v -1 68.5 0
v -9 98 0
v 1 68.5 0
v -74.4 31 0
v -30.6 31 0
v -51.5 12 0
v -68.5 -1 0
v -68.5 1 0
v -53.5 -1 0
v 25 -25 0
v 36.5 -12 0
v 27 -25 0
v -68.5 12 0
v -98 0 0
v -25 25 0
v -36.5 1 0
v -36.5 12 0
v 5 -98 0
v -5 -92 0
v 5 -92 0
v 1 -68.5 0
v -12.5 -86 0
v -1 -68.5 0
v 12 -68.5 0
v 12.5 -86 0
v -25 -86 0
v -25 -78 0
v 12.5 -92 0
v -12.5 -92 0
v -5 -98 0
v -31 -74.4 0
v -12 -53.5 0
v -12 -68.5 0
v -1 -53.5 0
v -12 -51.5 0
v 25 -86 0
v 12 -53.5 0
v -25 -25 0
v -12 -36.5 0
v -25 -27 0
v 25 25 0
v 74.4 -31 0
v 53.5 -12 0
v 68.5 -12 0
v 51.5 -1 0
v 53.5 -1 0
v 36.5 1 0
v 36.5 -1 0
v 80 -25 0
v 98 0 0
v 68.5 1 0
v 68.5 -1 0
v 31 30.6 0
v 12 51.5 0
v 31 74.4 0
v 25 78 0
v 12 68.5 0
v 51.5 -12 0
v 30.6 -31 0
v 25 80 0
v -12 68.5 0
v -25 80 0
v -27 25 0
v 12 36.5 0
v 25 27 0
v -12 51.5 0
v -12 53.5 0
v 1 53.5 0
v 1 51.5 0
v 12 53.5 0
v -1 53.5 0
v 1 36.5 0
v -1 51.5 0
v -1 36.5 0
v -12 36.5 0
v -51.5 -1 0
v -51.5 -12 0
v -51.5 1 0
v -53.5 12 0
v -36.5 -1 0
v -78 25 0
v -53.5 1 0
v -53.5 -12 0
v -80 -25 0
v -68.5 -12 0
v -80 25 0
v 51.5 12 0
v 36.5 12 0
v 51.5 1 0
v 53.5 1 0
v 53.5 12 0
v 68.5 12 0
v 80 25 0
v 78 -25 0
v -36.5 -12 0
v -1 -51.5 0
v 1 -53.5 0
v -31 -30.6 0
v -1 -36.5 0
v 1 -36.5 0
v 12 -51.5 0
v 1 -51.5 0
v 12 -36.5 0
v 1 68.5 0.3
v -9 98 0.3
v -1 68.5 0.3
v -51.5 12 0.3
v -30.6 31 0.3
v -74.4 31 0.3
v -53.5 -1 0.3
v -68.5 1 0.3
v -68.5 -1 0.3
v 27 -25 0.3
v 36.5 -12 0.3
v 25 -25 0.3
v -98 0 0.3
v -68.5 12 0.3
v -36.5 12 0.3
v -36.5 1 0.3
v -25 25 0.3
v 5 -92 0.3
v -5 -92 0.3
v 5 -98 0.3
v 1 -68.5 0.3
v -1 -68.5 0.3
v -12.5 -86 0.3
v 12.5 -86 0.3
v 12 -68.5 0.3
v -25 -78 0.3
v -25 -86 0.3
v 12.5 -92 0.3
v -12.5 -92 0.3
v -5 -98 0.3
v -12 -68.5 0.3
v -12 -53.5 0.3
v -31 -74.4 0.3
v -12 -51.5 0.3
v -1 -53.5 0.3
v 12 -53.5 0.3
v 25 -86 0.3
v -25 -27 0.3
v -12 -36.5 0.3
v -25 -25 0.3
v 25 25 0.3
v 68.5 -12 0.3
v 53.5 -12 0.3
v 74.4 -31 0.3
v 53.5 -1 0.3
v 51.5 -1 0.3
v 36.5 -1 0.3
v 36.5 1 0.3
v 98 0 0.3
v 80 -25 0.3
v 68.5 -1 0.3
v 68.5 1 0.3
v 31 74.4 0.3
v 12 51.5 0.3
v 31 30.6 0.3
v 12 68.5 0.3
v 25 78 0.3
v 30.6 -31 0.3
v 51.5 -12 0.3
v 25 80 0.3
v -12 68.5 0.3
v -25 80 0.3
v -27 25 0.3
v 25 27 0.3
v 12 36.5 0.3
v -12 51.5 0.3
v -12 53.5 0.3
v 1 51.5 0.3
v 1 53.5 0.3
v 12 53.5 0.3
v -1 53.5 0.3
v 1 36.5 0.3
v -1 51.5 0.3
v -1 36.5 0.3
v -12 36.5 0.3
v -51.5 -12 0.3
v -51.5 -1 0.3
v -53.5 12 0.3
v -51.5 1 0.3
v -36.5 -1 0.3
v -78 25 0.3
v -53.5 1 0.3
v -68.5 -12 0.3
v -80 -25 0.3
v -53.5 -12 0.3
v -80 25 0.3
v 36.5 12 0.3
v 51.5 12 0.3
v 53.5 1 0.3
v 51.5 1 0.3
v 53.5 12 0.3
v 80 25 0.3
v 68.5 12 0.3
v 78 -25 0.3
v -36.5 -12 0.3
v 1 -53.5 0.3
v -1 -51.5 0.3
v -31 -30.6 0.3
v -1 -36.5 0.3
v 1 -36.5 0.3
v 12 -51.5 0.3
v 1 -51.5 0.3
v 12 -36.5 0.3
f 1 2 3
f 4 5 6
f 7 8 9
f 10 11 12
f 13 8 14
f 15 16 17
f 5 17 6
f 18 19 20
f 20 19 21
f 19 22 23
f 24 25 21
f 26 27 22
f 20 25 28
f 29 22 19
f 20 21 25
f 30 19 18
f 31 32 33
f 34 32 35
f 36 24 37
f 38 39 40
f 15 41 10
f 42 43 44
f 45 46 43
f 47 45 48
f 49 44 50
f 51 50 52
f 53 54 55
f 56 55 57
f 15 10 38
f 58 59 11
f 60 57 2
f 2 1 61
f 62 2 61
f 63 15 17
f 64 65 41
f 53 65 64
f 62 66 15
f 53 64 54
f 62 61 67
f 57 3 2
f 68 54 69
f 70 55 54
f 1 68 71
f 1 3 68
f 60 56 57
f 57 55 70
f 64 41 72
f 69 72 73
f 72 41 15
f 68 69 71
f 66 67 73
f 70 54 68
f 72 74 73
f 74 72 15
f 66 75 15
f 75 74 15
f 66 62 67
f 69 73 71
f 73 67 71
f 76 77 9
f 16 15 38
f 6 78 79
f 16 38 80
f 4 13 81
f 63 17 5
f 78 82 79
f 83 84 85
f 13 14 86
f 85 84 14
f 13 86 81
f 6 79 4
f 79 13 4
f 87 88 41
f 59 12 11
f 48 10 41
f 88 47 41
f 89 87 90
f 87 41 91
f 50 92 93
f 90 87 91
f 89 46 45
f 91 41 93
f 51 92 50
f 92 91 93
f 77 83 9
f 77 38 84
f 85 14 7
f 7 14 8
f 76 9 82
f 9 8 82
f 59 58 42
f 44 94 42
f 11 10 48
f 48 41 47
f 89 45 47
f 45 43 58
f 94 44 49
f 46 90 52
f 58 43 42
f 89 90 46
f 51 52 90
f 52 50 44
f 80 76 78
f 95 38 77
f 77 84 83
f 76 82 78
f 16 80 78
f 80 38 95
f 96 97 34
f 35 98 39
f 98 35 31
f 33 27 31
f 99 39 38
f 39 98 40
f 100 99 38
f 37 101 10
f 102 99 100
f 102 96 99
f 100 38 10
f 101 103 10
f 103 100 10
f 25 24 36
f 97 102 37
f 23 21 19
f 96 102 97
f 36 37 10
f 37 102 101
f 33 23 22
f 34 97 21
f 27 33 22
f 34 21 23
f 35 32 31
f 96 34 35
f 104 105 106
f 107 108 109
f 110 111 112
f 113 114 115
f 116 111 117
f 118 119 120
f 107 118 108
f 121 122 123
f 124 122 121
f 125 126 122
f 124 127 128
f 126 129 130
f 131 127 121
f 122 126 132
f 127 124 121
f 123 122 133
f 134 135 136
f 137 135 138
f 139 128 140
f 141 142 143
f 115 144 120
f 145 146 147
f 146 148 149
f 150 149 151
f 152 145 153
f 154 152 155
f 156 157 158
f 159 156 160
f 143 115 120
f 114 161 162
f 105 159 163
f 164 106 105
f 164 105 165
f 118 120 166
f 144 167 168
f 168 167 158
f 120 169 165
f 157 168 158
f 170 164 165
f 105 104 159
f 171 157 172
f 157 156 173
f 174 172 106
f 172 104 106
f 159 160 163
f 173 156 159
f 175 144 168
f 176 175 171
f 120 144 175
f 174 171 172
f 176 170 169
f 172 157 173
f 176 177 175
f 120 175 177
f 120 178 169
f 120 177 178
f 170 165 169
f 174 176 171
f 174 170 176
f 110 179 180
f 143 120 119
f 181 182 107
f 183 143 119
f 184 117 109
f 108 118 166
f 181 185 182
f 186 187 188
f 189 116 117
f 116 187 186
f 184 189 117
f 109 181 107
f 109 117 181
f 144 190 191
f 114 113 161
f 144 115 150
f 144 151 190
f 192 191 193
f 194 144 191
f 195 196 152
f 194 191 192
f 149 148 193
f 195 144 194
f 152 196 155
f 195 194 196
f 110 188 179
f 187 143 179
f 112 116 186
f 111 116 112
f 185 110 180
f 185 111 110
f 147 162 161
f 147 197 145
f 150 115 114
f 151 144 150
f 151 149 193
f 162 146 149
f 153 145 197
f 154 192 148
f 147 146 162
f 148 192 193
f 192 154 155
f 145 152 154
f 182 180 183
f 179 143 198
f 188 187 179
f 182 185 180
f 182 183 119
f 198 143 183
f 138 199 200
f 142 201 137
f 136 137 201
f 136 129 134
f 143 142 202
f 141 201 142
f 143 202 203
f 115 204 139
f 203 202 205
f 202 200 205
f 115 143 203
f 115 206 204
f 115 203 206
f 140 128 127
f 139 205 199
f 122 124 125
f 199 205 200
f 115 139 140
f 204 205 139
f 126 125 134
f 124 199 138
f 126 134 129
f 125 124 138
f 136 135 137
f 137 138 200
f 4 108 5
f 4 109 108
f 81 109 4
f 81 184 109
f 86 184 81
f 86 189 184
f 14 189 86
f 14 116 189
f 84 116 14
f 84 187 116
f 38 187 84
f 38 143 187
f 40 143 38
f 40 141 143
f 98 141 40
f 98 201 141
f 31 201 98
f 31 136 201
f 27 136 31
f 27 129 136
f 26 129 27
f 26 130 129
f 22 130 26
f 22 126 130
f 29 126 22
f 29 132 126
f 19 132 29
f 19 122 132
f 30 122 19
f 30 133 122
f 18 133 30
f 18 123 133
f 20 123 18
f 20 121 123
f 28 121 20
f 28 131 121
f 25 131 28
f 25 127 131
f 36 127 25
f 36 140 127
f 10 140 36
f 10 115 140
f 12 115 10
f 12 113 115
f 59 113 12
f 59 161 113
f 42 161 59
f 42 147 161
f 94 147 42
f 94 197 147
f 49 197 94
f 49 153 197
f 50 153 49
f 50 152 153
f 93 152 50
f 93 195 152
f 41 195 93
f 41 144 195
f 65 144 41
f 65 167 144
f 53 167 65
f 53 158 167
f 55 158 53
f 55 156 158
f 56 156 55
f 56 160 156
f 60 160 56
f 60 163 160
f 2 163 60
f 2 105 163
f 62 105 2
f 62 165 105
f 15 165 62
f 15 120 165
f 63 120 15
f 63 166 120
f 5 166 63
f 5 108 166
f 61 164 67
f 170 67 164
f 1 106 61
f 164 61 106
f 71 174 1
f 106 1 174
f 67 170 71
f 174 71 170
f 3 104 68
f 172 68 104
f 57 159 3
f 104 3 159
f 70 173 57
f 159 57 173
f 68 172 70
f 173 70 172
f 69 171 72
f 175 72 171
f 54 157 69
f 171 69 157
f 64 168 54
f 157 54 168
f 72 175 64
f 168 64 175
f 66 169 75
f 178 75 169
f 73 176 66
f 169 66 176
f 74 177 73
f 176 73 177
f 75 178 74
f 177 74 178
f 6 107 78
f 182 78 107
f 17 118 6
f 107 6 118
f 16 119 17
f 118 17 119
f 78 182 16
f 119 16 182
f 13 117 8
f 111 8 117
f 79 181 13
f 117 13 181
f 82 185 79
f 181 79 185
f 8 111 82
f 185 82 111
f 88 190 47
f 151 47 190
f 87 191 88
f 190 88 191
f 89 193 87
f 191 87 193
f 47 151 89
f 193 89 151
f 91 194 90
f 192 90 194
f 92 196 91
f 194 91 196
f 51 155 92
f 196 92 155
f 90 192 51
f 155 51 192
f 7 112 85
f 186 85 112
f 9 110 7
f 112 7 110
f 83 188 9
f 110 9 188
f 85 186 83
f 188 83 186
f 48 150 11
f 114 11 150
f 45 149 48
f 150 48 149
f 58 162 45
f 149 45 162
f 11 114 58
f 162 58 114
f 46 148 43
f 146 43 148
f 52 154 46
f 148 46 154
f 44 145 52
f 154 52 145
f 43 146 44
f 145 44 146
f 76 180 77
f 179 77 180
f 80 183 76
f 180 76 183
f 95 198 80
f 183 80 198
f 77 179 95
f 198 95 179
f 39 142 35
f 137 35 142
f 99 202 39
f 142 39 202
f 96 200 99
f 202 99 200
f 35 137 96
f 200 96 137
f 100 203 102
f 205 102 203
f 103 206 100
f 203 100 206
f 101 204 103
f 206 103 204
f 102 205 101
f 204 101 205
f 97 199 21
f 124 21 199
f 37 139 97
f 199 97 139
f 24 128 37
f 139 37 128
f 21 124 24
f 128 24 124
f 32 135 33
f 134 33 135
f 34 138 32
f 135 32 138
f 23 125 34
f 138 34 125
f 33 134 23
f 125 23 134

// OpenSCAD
// Copyright (C) [Jonas Immanuel Frey] - Licensed under GPL

// One-piece paper lantern net. All dimensions are in millimetres.
// Roof shapes are upright silhouettes; the folded lantern is open on top.

/* [Output] */
output = "flat"; // [flat:Flat STL, cut:2D SVG or DXF, assembled:Folded preview, wall:Selected wall from outside]
// Guides appear only in the flat F5 preview, never in exported cutting geometry.
show_fold_guides = true;
paper_thickness = 0.3; // [0.1:0.05:1]

/* [House] */
// Square floor and width of each wall.
house_size = 50; // [30:1:90]
wall_height = 55; // [35:1:100]
roof_height = 18; // [0:1:40]
roof_style = "mixed"; // [mixed, gable, crooked, stepped, flat]

/* [Windows] */
// One centred window per wall. Cross leaves four panes joined by paper bars.
window_style = "cross"; // [cross, plain]
window_width = 24; // [10:1:60]
window_height = 32; // [10:1:70]
window_bar = 2; // [1:0.5:5]

/* [Glue tabs] */
glue_tab_width = 6; // [3:0.5:12]
// Clearance at the floor and eaves so neighbouring folds do not bunch up.
tab_inset = 2; // [1:0.5:5]

/* [Hidden] */
// The app supplies normalized polygons: [wall, centre_x, centre_y, width, points, paths, rotation].
decorations = is_undef(app_decorations) ? [] : app_decorations;
wall_windows = is_undef(app_wall_windows) ? [true, true, true, true] : app_wall_windows;
wall_index = 0;
has_windows = wall_windows[0] || wall_windows[1] || wall_windows[2] || wall_windows[3];
minimum_border = 2;
tab_taper = glue_tab_width * 0.6;
guide_width = 0.25;
mixed_roofs = ["crooked", "gable", "stepped", "gable"];
flat_span = house_size + 2 * (wall_height + (roof_style == "flat" ? 0 : roof_height));

assert(output == "flat" || output == "cut" || output == "assembled" || output == "wall",
       "Choose flat, cut, assembled or wall output.");
assert(roof_style == "mixed" || roof_style == "gable" || roof_style == "crooked"
       || roof_style == "stepped" || roof_style == "flat", "Unknown roof style.");
assert(window_style == "cross" || window_style == "plain", "Unknown window style.");
assert(house_size > 0 && wall_height > 0 && roof_height >= 0 && paper_thickness > 0,
       "House size, wall height and thickness must be positive; roof height cannot be negative.");
assert(glue_tab_width > 0 && tab_inset > 0
       && wall_height > 2 * (tab_inset + tab_taper),
       "Tabs need positive width/inset and enough wall height for their tapered ends.");
assert(house_size > 2 * (glue_tab_width + minimum_border),
       "House walls need room for both corner glue areas and a cutout.");
assert(!has_windows || (window_width > 0 && window_height > 0
       && window_width <= house_size - 2 * (glue_tab_width + minimum_border)
       && window_height <= wall_height - 2 * minimum_border),
       "Windows must leave 2 mm borders and space for the folded glue tabs.");
assert(!has_windows || window_style != "cross" || (window_bar >= 1
       && window_bar < min(window_width, window_height) - 2),
       "Window bars must be at least 1 mm wide and leave panes wider than 1 mm.");

echo(str("Floor: ", house_size, " x ", house_size,
         " mm; flat footprint: ", flat_span, " x ", flat_span, " mm."));

function wall_roof(index) = roof_style == "mixed" ? mixed_roofs[index] : roof_style;

// Local wall coordinates: x = width, y = height above the floor fold.
module wall_outline_2d(style) {
    if (style == "flat" || roof_height == 0)
        square([house_size, wall_height]);
    else if (style == "stepped")
        polygon([
            [0, 0], [house_size, 0],
            [house_size, wall_height + roof_height / 3],
            [house_size * 0.75, wall_height + roof_height / 3],
            [house_size * 0.75, wall_height + roof_height * 2 / 3],
            [house_size * 0.6, wall_height + roof_height * 2 / 3],
            [house_size * 0.6, wall_height + roof_height],
            [house_size * 0.4, wall_height + roof_height],
            [house_size * 0.4, wall_height + roof_height * 2 / 3],
            [house_size * 0.25, wall_height + roof_height * 2 / 3],
            [house_size * 0.25, wall_height + roof_height / 3],
            [0, wall_height + roof_height / 3]
        ]);
    else
        polygon([
            [0, 0], [house_size, 0], [house_size, wall_height],
            [house_size * (style == "crooked" ? 0.32 : 0.5), wall_height + roof_height],
            [0, wall_height]
        ]);
}

module window_cutout_2d() {
    translate([house_size / 2, wall_height / 2])
        difference() {
            square([window_width, window_height], center = true);
            if (window_style == "cross") {
                square([window_bar, window_height + 2], center = true);
                square([window_width + 2, window_bar], center = true);
            }
        }
}

module wall_2d(index) {
    difference() {
        wall_outline_2d(wall_roof(index));
        if (wall_windows[index]) window_cutout_2d();
        // Protect the perimeter, floor fold and folded corner glue areas.
        intersection() {
            offset(delta = -minimum_border) wall_outline_2d(wall_roof(index));
            translate([glue_tab_width + minimum_border, minimum_border])
                square([house_size - 2 * (glue_tab_width + minimum_border),
                        wall_height + roof_height]);
            union()
                for (decoration = decorations)
                    if (decoration[0] == index)
                        // The editor uses the outside view; the flat net faces inward.
                        // Rotation is in degrees clockwise as seen from outside.
                        translate([house_size - decoration[1], decoration[2]])
                            scale([-1, 1]) rotate(-decoration[6]) scale(decoration[3])
                                polygon(points = decoration[4], paths = decoration[5]);
        }
    }
}

// One tab on each wall's right edge; each corner receives exactly one tab.
module glue_tab_2d() {
    polygon([
        [house_size, tab_inset],
        [house_size + glue_tab_width, tab_inset + tab_taper],
        [house_size + glue_tab_width, wall_height - tab_inset - tab_taper],
        [house_size, wall_height - tab_inset]
    ]);
}

module place_flat_wall(index) {
    rotate([0, 0, index * 90])
        translate([-house_size / 2, house_size / 2, 0]) children();
}

module net_2d() {
    union() {
        square([house_size, house_size], center = true);
        for (index = [0:3])
            place_flat_wall(index) {
                wall_2d(index);
                glue_tab_2d();
            }
    }
}

module fold_guides_2d() {
    for (index = [0:3])
        place_flat_wall(index) {
            translate([0, -guide_width / 2]) square([house_size, guide_width]);
            translate([house_size - guide_width / 2, tab_inset])
                square([guide_width, wall_height - 2 * tab_inset]);
        }
}

// Idealised folds for inspection; no allowance for paper bend radius.
module assembled() {
    color("#56364b")
        linear_extrude(paper_thickness)
            square([house_size, house_size], center = true);
    for (index = [0:3])
        rotate([0, 0, index * 90])
            translate([-house_size / 2, house_size / 2, paper_thickness / 2])
                rotate([90, 0, 0]) {
                    color(index % 2 == 0 ? "#56364b" : "#754d65")
                        linear_extrude(paper_thickness) wall_2d(index);
                    // Swing the right-hand tab inward against the next wall.
                    color("#b890a8")
                        translate([house_size - paper_thickness, 0, 0])
                            rotate([0, -90, 0])
                                linear_extrude(paper_thickness)
                                    translate([-house_size, 0]) glue_tab_2d();
                }
}

if (output == "cut") net_2d();
else if (output == "wall")
    translate([house_size, 0]) mirror([1, 0]) wall_2d(wall_index);
else if (output == "assembled") assembled();
else {
    color("#56364b") linear_extrude(paper_thickness) net_2d();
    if ($preview && show_fold_guides)
        color("#ff9c38")
            translate([0, 0, paper_thickness + 0.01])
                linear_extrude(0.01) fold_guides_2d();
}
